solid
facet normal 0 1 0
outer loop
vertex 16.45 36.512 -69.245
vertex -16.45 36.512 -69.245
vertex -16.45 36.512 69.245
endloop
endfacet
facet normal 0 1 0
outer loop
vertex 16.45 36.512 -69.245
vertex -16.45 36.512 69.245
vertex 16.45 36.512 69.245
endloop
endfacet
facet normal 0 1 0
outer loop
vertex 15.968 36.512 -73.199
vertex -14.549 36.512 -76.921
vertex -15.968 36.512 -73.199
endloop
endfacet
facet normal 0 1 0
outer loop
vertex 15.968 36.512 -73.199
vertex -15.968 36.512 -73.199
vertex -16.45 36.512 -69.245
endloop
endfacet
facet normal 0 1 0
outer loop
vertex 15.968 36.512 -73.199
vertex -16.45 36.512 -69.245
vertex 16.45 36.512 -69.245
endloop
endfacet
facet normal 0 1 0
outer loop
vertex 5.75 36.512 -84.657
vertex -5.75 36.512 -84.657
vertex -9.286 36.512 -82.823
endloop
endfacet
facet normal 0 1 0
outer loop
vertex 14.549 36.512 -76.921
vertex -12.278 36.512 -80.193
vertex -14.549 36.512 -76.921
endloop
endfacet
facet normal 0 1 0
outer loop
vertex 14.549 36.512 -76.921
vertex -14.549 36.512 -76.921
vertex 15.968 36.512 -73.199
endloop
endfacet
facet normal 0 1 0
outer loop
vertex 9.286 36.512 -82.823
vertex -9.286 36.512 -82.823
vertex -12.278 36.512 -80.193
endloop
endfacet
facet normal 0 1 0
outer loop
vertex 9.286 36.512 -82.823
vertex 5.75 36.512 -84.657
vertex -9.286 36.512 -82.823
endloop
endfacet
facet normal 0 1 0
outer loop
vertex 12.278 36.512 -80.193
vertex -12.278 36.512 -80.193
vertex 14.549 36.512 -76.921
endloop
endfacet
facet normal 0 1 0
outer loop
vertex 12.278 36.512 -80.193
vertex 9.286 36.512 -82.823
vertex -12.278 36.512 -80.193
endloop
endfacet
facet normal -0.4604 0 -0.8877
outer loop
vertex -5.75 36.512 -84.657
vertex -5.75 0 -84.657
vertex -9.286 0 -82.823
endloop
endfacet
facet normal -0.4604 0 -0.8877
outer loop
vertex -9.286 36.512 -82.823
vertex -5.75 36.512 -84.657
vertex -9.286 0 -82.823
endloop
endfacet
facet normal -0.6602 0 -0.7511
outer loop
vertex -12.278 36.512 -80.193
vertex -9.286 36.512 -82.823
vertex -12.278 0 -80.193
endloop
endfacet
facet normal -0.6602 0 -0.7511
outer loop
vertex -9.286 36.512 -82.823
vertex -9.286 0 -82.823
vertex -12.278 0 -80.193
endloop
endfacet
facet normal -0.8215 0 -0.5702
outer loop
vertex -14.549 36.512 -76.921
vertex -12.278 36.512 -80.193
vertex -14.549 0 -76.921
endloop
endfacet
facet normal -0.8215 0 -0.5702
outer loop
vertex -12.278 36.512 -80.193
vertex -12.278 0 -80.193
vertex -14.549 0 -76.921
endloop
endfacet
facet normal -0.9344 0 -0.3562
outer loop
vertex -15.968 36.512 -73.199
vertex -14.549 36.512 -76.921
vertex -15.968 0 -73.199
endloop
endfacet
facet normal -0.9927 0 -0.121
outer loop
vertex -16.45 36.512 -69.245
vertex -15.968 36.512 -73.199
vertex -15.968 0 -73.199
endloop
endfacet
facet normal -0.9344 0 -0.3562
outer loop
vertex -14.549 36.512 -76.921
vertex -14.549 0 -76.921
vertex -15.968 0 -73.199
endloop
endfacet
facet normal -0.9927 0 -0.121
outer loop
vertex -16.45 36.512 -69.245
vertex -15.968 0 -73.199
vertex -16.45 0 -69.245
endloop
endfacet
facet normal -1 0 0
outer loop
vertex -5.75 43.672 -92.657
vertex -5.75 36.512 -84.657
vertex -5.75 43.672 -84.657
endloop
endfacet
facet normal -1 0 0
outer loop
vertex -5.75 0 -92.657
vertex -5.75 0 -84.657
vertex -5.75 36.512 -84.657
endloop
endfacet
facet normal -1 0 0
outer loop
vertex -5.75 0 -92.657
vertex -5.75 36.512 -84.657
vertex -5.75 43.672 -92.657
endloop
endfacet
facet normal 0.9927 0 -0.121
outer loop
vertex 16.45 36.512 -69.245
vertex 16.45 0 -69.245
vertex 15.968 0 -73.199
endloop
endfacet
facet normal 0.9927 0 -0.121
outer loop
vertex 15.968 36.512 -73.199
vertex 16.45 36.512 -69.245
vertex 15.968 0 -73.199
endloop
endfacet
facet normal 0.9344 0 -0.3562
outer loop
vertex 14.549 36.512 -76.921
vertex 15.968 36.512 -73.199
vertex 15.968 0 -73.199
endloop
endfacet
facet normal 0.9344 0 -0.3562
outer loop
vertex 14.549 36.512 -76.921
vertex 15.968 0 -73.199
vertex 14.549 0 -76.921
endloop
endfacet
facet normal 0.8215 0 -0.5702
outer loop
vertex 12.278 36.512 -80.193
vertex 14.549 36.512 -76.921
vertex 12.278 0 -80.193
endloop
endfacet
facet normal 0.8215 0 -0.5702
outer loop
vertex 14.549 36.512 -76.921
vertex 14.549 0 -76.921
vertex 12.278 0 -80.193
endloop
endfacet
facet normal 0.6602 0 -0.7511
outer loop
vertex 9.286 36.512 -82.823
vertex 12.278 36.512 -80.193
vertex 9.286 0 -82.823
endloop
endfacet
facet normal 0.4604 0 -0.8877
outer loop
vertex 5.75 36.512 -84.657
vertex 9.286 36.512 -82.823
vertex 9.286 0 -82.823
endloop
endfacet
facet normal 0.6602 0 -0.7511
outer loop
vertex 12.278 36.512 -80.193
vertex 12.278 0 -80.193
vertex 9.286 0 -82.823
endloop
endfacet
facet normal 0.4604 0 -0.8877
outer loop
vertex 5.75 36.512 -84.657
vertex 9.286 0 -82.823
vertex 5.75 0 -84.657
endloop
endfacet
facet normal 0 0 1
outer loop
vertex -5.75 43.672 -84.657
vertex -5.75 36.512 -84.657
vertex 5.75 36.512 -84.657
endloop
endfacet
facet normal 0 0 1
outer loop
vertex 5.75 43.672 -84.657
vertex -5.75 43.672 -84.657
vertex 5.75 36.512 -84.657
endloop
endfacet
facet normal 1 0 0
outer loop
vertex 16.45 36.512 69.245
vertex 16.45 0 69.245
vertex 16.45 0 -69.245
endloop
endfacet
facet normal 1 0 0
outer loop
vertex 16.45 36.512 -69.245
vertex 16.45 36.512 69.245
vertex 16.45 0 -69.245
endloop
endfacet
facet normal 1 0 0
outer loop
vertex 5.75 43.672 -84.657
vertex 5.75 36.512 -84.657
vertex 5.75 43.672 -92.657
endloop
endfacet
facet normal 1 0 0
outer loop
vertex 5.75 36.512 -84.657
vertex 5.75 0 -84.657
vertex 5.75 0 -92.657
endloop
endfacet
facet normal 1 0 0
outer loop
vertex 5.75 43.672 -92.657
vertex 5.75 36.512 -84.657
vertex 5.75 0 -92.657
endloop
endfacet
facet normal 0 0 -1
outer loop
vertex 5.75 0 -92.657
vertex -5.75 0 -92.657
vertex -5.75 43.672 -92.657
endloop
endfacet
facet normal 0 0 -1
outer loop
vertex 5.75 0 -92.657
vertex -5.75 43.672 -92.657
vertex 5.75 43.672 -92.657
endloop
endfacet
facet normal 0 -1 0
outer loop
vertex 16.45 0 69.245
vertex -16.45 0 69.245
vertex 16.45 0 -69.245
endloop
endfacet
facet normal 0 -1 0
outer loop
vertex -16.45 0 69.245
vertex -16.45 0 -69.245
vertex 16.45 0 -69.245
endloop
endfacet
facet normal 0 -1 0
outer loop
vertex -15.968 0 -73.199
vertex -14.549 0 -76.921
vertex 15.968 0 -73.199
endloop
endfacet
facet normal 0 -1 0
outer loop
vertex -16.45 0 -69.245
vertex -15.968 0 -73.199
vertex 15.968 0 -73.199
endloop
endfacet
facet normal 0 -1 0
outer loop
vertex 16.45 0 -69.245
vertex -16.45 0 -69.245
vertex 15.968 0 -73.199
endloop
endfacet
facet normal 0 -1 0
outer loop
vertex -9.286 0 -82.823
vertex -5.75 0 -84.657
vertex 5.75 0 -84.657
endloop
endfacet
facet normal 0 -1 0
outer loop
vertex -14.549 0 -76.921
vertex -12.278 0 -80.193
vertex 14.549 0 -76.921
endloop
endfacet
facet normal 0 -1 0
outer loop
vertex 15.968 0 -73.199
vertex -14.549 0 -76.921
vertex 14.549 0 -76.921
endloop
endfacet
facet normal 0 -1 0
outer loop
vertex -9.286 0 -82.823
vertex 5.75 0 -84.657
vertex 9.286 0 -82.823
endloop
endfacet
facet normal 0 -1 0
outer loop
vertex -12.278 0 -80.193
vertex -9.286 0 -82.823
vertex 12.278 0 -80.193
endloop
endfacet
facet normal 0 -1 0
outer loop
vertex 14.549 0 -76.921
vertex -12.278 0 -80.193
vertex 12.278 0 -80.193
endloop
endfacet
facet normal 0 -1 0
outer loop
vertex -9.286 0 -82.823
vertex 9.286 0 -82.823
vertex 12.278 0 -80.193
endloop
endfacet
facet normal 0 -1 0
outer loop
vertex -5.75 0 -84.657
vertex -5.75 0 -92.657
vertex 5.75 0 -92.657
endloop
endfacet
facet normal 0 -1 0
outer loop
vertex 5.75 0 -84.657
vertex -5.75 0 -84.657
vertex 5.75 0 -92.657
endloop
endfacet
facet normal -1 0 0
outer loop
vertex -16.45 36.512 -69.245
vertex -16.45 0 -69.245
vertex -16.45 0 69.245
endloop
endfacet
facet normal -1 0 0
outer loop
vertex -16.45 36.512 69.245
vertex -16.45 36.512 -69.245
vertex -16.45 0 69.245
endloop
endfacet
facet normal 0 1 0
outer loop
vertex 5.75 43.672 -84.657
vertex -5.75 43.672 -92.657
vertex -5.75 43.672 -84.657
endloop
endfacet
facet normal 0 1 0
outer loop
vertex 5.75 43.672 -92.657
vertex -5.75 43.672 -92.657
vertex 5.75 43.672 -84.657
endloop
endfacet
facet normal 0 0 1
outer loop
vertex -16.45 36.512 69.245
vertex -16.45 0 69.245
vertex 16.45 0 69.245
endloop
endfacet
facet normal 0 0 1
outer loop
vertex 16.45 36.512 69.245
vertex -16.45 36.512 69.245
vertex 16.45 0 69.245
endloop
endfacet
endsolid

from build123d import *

# Parameters (mm, degrees)
BOSS_EXTRUDE1_DEPTH = 36.5125
SKETCH2_W           = 11.5
SKETCH2_H           = 8
BOSS_EXTRUDE2_DEPTH = 7.16


with BuildPart() as part:
    # Sketch1 → Boss-Extrude1 (new body)
    with BuildSketch(Plane(origin=(0, 0, 0), x_dir=(1, 0, 0), z_dir=(0, 1, 0))):
        with BuildLine():
            Line((-16.45, -69.245), (16.45, -69.245))
            Line((16.45, -69.245), (16.45, 69.245))
            ThreePointArc((16.45, 69.245), (13.512771736, 78.626231262), (5.75, 84.657332724))
            Line((5.75, 84.657332724), (5.75, 92.657332724))
            Line((5.75, 92.657332724), (-5.75, 92.657332724))
            Line((-5.75, 92.657332724), (-5.75, 84.657332724))
            ThreePointArc((-5.75, 84.657332724), (-13.512771736, 78.626231262), (-16.45, 69.245))
            Line((-16.45, 69.245), (-16.45, -69.245))
        make_face()
    extrude(amount=BOSS_EXTRUDE1_DEPTH)

    # Sketch2 → Boss-Extrude2 (add)
    with BuildSketch(Plane(origin=(0, 36.5125, 0), x_dir=(1, 0, 0), z_dir=(0, 1, 0))):
        with Locations((0, 88.657332724)):
            Rectangle(SKETCH2_W, SKETCH2_H)
    extrude(amount=BOSS_EXTRUDE2_DEPTH)


solid = part.part
